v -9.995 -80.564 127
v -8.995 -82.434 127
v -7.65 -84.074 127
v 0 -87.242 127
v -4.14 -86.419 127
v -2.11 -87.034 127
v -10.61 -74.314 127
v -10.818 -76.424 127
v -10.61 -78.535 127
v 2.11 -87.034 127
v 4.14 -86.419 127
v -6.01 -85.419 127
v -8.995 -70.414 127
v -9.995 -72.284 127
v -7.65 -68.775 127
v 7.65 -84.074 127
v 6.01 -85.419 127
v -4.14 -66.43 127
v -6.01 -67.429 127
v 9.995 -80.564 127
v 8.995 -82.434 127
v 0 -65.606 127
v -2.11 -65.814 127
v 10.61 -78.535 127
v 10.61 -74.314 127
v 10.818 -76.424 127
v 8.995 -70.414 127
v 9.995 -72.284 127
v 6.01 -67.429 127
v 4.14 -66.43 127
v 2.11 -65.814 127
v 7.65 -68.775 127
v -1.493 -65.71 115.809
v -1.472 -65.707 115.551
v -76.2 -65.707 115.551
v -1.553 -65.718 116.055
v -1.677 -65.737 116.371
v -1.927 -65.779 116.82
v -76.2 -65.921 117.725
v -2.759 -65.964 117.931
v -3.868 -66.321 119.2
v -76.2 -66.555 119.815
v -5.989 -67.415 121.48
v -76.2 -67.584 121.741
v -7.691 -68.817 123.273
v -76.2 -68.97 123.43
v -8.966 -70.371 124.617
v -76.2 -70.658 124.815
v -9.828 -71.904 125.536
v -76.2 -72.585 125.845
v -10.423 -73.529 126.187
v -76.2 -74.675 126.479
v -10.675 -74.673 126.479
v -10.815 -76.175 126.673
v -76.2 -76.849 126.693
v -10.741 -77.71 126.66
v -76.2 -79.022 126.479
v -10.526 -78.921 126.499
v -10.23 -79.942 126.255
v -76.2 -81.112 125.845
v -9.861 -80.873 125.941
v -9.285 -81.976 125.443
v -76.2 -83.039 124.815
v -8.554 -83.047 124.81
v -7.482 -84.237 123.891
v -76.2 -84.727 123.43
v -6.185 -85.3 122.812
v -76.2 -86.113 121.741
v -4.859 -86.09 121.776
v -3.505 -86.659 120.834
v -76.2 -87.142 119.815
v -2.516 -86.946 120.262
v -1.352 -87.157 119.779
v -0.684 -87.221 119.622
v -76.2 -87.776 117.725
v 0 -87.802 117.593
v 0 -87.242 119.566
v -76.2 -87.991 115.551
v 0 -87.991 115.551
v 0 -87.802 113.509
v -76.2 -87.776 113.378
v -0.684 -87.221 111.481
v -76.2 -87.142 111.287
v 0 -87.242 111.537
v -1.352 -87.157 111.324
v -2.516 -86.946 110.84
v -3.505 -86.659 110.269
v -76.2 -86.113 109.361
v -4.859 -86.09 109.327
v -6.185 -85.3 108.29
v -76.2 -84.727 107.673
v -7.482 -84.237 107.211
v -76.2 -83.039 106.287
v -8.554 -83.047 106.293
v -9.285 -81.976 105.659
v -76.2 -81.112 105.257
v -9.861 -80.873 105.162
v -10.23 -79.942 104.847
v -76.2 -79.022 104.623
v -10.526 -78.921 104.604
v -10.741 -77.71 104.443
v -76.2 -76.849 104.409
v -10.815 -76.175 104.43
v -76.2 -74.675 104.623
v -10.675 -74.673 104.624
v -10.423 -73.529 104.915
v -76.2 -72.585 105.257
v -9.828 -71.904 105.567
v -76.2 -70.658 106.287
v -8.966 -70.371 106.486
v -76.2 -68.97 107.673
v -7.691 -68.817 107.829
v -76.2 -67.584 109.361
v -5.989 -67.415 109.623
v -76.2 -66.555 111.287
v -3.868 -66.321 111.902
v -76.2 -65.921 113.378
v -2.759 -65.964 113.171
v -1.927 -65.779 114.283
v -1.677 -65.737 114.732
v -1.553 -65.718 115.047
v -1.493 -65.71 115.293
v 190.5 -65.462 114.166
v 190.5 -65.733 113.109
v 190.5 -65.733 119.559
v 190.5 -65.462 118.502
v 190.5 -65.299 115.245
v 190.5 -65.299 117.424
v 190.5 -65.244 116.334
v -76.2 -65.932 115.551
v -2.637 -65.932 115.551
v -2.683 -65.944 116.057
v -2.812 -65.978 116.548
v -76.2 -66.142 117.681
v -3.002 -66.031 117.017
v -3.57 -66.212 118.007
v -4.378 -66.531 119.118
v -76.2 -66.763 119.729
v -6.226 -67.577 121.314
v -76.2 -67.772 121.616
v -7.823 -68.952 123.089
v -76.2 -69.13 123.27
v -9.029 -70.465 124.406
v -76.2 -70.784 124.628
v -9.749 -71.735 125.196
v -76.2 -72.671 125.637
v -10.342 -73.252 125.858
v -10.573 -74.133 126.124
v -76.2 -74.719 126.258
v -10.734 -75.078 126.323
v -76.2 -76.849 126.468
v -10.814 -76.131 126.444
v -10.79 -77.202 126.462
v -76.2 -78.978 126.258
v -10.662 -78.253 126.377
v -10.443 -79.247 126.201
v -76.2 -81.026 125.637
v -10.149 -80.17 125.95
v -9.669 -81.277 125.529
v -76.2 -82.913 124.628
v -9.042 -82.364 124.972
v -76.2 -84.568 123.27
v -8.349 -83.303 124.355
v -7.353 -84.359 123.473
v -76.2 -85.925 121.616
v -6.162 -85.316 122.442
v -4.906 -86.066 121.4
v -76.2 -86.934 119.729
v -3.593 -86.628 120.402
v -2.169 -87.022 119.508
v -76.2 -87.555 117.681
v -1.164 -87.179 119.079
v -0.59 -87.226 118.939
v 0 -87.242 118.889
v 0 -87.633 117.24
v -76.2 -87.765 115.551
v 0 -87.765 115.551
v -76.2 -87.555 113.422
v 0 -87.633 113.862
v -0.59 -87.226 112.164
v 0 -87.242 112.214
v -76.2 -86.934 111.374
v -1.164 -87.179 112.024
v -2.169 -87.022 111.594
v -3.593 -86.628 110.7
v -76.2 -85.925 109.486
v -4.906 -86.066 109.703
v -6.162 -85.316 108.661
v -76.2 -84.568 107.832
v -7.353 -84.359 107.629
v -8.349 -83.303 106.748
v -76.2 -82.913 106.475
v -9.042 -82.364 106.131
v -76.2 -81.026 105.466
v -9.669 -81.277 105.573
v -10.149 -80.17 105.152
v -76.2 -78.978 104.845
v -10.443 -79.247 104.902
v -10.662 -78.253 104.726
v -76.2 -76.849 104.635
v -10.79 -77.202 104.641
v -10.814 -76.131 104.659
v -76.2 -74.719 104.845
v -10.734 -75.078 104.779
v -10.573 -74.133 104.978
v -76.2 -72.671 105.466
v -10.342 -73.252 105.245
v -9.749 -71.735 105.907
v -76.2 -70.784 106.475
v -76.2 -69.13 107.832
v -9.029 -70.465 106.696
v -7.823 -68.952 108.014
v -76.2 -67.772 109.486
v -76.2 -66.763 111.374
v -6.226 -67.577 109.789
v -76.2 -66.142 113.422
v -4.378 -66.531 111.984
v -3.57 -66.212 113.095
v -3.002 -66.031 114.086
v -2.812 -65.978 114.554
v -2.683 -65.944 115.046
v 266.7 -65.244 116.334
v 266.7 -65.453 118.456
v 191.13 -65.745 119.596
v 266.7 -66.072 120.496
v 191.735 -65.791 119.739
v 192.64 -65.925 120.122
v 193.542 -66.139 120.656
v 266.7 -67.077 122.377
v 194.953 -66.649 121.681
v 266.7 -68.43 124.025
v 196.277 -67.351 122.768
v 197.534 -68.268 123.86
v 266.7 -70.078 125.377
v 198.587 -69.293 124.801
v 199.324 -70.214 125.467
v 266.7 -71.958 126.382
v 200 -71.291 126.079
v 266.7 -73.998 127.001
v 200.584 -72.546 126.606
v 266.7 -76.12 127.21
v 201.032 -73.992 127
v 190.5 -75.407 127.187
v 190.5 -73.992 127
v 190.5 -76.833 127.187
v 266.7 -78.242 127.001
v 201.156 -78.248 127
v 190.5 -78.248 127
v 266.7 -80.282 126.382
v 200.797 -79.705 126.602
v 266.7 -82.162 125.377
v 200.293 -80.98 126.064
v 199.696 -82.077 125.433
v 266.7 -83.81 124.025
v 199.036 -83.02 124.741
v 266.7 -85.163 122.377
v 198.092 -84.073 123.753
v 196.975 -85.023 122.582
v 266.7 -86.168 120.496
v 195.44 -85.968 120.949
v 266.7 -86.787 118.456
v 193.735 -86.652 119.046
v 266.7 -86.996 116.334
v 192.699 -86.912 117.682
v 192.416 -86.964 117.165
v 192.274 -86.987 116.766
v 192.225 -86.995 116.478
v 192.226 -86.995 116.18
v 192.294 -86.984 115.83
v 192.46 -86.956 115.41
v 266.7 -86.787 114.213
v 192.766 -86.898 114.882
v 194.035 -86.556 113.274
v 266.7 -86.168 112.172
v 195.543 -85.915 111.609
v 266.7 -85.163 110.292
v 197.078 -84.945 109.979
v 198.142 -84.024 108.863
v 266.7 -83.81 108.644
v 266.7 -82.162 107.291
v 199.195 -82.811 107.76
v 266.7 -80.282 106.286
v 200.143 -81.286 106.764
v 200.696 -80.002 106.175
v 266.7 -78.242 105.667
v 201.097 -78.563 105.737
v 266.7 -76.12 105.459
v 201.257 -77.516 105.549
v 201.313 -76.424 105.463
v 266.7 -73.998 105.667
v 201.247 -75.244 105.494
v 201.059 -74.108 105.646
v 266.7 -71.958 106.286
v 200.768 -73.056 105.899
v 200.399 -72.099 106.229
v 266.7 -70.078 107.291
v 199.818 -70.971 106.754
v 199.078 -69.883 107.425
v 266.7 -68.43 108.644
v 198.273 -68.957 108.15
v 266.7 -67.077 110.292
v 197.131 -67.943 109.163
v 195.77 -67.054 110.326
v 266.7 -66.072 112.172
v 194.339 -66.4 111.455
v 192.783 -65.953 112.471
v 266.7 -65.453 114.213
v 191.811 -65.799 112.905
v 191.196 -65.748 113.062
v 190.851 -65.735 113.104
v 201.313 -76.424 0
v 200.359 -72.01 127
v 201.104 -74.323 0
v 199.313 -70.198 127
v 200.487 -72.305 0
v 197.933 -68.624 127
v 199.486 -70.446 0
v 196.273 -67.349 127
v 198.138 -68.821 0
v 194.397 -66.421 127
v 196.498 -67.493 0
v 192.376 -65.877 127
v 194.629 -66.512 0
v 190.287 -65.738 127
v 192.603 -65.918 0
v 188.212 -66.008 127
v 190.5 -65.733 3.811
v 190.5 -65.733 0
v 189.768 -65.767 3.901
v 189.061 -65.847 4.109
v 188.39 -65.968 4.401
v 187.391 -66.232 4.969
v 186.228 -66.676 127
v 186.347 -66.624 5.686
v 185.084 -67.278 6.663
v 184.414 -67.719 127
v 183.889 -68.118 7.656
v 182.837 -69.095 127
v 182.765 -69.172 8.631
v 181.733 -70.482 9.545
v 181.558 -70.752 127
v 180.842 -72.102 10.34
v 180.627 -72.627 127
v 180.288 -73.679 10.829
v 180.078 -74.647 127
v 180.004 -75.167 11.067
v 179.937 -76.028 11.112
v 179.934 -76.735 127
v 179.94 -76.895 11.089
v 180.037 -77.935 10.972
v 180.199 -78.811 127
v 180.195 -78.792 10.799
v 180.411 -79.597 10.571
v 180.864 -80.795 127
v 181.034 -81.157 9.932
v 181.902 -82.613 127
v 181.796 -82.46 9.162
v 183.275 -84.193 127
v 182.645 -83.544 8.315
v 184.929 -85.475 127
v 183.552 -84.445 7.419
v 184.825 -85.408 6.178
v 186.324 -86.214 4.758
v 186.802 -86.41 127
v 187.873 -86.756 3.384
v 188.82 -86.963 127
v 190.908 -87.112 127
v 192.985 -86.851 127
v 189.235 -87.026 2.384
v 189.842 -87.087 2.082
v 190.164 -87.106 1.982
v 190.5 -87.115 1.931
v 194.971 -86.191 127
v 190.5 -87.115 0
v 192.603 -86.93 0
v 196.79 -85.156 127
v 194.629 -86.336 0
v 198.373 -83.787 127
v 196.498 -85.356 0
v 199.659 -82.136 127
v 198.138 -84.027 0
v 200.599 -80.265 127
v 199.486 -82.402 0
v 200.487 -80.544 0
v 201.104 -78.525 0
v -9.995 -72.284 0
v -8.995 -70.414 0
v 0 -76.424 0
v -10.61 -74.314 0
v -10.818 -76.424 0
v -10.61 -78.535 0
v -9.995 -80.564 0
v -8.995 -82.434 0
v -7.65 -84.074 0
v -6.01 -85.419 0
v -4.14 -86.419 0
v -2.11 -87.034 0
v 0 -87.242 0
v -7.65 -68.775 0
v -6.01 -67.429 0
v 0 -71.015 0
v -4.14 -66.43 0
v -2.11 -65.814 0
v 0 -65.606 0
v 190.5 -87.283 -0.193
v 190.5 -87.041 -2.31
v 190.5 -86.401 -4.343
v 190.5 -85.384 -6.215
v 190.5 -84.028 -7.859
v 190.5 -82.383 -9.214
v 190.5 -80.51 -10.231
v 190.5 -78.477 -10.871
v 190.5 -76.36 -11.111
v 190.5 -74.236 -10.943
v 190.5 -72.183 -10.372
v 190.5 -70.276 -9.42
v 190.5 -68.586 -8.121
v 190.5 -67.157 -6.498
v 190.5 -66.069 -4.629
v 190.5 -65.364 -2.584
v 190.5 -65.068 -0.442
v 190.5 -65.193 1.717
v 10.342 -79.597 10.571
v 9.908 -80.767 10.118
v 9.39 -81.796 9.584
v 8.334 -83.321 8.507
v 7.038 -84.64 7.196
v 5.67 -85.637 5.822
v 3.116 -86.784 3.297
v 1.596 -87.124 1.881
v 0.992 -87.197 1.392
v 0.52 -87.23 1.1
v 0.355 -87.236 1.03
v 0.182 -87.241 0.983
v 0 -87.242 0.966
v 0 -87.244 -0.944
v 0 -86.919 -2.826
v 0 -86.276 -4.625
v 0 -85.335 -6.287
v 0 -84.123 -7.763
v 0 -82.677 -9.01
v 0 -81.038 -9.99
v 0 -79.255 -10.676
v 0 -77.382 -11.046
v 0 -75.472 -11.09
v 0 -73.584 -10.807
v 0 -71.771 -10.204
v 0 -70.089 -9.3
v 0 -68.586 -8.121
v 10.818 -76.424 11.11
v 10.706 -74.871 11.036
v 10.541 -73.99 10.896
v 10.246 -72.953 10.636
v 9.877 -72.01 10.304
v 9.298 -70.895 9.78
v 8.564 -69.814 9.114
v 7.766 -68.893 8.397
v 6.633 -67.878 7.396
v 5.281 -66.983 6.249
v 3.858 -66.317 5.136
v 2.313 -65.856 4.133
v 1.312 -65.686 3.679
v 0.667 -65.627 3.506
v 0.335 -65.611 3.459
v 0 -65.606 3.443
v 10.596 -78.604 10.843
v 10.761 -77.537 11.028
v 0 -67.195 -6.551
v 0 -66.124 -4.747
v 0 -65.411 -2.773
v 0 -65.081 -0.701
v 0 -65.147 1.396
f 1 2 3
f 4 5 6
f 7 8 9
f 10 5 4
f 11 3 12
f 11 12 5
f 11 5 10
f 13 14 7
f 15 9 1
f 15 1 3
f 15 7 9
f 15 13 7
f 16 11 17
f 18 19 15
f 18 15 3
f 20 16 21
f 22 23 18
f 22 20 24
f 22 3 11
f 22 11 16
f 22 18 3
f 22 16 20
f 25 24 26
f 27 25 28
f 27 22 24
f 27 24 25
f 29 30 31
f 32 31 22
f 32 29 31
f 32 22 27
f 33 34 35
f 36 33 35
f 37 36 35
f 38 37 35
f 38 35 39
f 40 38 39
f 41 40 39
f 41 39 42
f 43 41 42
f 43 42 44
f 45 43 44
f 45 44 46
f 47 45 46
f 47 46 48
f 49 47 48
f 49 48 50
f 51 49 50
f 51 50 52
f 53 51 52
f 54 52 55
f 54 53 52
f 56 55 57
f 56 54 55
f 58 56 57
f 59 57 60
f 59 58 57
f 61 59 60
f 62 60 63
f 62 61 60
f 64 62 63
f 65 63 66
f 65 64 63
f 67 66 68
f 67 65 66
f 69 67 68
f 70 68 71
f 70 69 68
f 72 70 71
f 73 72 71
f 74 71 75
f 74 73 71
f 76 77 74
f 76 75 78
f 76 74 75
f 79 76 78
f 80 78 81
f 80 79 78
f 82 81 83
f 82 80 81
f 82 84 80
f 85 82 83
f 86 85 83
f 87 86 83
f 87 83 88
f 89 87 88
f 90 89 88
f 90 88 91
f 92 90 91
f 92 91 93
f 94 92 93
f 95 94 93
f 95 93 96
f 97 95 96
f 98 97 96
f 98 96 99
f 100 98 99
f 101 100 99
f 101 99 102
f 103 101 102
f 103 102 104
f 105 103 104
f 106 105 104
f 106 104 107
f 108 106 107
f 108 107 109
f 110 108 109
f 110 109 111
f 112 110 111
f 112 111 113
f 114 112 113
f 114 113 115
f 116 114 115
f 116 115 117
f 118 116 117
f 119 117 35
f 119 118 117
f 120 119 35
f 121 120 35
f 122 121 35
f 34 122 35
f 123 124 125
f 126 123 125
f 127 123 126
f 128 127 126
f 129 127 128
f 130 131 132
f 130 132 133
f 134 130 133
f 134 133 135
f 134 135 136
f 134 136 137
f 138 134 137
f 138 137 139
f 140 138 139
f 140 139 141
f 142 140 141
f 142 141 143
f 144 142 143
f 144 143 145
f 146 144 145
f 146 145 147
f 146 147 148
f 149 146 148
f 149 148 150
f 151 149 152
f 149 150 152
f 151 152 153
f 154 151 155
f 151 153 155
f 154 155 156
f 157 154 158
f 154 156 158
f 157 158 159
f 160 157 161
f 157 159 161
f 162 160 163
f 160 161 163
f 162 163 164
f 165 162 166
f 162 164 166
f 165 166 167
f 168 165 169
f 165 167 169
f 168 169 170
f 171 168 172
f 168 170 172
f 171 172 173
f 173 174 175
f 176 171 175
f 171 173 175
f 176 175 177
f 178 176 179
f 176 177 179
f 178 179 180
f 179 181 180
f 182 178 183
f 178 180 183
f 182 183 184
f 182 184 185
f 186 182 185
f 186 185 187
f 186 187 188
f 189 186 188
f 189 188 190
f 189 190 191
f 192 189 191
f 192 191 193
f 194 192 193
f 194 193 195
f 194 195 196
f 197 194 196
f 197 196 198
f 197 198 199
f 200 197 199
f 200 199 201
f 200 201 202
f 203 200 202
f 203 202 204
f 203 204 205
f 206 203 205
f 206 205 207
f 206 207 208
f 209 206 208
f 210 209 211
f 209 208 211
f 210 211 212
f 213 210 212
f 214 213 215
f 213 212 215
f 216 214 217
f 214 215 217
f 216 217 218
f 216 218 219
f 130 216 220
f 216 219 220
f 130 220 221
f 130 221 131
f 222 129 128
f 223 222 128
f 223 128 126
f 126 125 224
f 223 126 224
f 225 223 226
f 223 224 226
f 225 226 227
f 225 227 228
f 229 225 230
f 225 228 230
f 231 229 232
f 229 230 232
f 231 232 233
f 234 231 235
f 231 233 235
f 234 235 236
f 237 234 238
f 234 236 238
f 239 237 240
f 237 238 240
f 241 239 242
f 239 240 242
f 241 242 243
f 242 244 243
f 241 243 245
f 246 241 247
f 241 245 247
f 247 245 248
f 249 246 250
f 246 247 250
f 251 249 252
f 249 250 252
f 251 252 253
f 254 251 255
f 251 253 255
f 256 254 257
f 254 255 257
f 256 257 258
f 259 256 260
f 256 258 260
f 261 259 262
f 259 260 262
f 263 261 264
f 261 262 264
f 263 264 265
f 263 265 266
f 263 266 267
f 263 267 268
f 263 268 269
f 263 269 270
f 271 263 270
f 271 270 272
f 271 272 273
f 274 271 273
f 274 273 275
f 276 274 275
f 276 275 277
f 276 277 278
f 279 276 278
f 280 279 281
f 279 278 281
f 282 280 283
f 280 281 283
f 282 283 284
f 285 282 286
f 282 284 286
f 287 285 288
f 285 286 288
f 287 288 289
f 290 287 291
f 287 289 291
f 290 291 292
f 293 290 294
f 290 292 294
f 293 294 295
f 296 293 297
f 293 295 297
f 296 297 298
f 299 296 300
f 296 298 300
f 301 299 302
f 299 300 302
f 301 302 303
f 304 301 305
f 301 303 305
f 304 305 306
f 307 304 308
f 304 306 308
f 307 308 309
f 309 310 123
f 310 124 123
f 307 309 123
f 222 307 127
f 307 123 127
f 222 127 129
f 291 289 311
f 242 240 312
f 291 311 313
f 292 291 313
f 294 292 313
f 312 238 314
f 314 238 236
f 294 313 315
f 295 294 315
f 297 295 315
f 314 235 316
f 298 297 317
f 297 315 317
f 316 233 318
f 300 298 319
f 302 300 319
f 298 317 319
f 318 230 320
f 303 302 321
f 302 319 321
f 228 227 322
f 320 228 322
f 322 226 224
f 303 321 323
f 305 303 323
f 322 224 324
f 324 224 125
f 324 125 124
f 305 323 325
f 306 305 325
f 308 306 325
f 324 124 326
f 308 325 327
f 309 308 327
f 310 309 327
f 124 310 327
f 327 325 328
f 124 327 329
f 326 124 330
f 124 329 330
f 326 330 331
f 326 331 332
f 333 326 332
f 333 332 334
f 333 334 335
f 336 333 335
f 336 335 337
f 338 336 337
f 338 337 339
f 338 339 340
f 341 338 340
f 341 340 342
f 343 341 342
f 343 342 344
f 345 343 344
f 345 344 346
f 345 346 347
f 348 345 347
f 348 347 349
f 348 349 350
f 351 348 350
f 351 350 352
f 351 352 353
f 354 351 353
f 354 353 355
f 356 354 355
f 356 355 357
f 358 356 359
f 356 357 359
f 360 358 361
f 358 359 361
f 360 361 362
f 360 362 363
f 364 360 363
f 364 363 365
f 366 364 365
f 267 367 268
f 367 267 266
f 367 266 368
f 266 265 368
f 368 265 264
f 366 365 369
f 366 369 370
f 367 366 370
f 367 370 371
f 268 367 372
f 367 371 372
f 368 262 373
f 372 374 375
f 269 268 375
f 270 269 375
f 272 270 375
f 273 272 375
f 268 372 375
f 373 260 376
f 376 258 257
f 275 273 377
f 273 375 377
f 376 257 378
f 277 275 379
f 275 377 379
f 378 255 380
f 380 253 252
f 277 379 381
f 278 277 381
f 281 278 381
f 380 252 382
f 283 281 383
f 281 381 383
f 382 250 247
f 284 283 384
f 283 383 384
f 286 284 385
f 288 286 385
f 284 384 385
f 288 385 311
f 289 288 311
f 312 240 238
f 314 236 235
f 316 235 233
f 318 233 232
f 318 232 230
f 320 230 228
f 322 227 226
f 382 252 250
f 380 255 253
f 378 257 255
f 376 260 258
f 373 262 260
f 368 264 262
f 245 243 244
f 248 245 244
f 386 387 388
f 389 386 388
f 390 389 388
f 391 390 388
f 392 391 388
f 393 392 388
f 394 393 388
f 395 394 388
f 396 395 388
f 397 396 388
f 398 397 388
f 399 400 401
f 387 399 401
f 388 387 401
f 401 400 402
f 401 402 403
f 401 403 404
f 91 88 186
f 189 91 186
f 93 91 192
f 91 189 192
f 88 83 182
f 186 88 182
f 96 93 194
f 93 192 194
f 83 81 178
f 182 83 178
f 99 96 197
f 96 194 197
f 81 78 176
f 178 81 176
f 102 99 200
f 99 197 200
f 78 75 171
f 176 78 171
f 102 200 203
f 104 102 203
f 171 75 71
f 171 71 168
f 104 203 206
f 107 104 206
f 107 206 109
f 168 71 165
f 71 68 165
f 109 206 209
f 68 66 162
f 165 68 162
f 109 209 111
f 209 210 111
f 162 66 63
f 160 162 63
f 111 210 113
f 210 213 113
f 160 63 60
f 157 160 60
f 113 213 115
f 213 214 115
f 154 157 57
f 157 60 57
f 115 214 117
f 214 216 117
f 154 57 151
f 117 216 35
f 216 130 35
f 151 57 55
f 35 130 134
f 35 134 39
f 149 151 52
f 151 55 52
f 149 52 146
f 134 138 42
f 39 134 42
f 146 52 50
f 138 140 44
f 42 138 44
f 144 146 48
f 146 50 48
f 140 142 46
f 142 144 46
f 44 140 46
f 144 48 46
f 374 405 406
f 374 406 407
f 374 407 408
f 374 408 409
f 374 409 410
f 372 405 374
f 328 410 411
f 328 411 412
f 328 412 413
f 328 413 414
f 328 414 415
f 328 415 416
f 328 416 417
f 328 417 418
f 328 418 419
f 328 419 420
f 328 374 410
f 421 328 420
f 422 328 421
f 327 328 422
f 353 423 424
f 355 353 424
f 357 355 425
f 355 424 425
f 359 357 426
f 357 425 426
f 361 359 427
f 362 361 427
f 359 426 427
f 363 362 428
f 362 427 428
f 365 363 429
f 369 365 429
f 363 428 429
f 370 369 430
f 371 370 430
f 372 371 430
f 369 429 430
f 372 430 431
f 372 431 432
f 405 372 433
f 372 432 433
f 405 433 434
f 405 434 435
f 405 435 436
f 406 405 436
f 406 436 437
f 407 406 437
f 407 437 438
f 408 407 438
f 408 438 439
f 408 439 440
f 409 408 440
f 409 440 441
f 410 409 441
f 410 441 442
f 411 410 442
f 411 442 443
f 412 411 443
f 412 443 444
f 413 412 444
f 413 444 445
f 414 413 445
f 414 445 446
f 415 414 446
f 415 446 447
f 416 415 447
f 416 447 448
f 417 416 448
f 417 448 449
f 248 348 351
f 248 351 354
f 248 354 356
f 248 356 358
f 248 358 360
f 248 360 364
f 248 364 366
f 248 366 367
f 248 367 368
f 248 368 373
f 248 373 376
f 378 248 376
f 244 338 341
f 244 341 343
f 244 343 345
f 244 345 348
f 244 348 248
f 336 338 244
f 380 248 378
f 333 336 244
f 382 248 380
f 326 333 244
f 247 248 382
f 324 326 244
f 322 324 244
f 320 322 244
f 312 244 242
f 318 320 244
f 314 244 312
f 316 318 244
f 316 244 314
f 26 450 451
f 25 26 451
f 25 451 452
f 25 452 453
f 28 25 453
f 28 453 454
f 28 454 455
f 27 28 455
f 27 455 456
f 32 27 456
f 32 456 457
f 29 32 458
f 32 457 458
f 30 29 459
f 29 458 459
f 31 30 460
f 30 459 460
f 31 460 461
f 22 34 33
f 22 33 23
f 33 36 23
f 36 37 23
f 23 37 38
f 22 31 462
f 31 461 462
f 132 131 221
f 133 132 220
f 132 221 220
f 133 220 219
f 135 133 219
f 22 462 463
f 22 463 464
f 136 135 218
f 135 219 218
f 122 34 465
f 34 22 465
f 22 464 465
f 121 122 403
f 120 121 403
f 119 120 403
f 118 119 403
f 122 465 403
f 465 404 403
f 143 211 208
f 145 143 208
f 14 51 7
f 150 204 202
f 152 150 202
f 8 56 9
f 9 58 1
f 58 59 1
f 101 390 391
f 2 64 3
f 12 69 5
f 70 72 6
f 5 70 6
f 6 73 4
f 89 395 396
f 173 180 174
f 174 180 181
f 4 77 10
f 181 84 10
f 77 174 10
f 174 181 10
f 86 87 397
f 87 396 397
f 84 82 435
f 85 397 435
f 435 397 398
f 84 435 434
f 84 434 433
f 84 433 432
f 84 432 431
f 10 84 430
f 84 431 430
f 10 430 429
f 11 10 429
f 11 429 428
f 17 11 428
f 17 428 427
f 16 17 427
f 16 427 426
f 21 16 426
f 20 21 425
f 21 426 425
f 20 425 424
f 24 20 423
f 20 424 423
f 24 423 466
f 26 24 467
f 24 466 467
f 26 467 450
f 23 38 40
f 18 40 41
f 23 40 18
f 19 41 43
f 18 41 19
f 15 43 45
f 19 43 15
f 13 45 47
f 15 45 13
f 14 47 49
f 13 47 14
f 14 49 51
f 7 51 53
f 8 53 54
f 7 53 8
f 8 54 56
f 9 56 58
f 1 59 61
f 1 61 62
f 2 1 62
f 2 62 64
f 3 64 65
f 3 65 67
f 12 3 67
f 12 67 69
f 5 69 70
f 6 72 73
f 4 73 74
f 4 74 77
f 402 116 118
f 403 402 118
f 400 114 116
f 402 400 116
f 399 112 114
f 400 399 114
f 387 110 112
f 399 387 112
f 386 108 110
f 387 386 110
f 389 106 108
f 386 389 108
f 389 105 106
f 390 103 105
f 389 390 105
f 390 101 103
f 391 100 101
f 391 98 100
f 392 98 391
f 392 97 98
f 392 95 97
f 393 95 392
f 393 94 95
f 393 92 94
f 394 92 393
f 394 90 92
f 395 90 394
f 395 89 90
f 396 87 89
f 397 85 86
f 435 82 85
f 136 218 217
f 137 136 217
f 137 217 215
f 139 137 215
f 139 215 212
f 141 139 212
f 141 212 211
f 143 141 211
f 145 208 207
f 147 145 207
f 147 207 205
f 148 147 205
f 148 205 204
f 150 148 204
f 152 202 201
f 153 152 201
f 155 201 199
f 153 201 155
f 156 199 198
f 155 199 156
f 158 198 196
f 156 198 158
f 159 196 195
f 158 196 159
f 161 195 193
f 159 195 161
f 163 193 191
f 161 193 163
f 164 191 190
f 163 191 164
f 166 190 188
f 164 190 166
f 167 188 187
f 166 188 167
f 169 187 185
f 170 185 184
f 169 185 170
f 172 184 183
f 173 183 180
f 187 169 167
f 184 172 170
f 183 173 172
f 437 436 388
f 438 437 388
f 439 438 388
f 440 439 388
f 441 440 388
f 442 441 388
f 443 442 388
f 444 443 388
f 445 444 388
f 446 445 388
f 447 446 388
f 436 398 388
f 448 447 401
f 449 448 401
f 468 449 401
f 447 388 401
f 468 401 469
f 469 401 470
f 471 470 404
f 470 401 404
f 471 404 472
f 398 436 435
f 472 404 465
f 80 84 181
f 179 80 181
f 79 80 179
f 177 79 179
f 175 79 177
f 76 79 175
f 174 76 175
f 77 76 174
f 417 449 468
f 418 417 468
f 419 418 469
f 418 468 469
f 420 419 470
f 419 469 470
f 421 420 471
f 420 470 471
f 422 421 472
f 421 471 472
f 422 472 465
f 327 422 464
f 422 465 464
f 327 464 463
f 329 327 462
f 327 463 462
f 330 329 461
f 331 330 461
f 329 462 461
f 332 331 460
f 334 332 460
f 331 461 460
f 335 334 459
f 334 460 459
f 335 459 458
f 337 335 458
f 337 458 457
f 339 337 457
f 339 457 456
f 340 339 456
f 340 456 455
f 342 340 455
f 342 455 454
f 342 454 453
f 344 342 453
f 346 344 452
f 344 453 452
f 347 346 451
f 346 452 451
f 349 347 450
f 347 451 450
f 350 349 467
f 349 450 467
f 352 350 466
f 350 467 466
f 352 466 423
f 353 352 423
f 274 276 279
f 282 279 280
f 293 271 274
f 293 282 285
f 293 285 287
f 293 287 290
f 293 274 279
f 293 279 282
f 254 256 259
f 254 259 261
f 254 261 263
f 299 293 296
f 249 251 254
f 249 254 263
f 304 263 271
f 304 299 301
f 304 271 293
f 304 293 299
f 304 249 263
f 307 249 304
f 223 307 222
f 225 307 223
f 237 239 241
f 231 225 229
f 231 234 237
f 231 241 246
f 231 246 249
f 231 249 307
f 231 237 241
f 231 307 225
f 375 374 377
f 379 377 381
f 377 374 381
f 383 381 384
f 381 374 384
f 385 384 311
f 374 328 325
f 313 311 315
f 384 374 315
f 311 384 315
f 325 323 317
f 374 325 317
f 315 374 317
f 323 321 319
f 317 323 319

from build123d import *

# Parameters (mm, degrees)
F1_DEPTH = 190.5
F2_R     = 10.818044
F3_DEPTH = 127
F2_R_2   = 10.691628
F4_DEPTH = 127
F5_R     = 11.141962
F5_R_2   = 10.916341
F6_DEPTH = 76.2
F7_R     = 10.875838
F8_DEPTH = 76.2


with BuildPart() as f1:
    # F0 (on Right) → F1 (new body)
    with BuildSketch(Plane.YZ):
        with BuildLine():
            ThreePointArc((-79.597275, 10.571338), (-85.746525, -5.640093), (-68.586435, -8.121035))
            ThreePointArc((-68.586435, -8.121035), (-66.596902, 5.640093), (-79.597275, 10.571338))
        make_face()
    extrude(amount=F1_DEPTH)

    # F2 (on Top) → F3 (join)
    with BuildSketch(Plane.XY):
        with Locations((0, -76.424129)):
            Circle(F2_R)
    extrude(amount=F3_DEPTH)

    # F2 (on Top) → F4 (join)
    with BuildSketch(Plane.XY):
        with Locations((0, -76.424129)):
            Circle(F2_R)
        with Locations((190.621048, -76.424129)):
            Circle(F2_R_2)
    extrude(amount=F4_DEPTH)

    # F5 (on Right) → F6 (join)
    with BuildSketch(Plane.YZ):
        with Locations((-76.848619, 115.551263)):
            Circle(F5_R)
        with Locations((-76.848619, 115.551263)):
            Circle(F5_R_2, mode=Mode.SUBTRACT)
    extrude(amount=-F6_DEPTH)

    # F7 (on face) → F8 (join)
    with BuildSketch(Plane.YZ.offset(190.5)):
        with Locations((-76.119892, 116.334341)):
            Circle(F7_R)
    extrude(amount=F8_DEPTH)


solid = f1.part
